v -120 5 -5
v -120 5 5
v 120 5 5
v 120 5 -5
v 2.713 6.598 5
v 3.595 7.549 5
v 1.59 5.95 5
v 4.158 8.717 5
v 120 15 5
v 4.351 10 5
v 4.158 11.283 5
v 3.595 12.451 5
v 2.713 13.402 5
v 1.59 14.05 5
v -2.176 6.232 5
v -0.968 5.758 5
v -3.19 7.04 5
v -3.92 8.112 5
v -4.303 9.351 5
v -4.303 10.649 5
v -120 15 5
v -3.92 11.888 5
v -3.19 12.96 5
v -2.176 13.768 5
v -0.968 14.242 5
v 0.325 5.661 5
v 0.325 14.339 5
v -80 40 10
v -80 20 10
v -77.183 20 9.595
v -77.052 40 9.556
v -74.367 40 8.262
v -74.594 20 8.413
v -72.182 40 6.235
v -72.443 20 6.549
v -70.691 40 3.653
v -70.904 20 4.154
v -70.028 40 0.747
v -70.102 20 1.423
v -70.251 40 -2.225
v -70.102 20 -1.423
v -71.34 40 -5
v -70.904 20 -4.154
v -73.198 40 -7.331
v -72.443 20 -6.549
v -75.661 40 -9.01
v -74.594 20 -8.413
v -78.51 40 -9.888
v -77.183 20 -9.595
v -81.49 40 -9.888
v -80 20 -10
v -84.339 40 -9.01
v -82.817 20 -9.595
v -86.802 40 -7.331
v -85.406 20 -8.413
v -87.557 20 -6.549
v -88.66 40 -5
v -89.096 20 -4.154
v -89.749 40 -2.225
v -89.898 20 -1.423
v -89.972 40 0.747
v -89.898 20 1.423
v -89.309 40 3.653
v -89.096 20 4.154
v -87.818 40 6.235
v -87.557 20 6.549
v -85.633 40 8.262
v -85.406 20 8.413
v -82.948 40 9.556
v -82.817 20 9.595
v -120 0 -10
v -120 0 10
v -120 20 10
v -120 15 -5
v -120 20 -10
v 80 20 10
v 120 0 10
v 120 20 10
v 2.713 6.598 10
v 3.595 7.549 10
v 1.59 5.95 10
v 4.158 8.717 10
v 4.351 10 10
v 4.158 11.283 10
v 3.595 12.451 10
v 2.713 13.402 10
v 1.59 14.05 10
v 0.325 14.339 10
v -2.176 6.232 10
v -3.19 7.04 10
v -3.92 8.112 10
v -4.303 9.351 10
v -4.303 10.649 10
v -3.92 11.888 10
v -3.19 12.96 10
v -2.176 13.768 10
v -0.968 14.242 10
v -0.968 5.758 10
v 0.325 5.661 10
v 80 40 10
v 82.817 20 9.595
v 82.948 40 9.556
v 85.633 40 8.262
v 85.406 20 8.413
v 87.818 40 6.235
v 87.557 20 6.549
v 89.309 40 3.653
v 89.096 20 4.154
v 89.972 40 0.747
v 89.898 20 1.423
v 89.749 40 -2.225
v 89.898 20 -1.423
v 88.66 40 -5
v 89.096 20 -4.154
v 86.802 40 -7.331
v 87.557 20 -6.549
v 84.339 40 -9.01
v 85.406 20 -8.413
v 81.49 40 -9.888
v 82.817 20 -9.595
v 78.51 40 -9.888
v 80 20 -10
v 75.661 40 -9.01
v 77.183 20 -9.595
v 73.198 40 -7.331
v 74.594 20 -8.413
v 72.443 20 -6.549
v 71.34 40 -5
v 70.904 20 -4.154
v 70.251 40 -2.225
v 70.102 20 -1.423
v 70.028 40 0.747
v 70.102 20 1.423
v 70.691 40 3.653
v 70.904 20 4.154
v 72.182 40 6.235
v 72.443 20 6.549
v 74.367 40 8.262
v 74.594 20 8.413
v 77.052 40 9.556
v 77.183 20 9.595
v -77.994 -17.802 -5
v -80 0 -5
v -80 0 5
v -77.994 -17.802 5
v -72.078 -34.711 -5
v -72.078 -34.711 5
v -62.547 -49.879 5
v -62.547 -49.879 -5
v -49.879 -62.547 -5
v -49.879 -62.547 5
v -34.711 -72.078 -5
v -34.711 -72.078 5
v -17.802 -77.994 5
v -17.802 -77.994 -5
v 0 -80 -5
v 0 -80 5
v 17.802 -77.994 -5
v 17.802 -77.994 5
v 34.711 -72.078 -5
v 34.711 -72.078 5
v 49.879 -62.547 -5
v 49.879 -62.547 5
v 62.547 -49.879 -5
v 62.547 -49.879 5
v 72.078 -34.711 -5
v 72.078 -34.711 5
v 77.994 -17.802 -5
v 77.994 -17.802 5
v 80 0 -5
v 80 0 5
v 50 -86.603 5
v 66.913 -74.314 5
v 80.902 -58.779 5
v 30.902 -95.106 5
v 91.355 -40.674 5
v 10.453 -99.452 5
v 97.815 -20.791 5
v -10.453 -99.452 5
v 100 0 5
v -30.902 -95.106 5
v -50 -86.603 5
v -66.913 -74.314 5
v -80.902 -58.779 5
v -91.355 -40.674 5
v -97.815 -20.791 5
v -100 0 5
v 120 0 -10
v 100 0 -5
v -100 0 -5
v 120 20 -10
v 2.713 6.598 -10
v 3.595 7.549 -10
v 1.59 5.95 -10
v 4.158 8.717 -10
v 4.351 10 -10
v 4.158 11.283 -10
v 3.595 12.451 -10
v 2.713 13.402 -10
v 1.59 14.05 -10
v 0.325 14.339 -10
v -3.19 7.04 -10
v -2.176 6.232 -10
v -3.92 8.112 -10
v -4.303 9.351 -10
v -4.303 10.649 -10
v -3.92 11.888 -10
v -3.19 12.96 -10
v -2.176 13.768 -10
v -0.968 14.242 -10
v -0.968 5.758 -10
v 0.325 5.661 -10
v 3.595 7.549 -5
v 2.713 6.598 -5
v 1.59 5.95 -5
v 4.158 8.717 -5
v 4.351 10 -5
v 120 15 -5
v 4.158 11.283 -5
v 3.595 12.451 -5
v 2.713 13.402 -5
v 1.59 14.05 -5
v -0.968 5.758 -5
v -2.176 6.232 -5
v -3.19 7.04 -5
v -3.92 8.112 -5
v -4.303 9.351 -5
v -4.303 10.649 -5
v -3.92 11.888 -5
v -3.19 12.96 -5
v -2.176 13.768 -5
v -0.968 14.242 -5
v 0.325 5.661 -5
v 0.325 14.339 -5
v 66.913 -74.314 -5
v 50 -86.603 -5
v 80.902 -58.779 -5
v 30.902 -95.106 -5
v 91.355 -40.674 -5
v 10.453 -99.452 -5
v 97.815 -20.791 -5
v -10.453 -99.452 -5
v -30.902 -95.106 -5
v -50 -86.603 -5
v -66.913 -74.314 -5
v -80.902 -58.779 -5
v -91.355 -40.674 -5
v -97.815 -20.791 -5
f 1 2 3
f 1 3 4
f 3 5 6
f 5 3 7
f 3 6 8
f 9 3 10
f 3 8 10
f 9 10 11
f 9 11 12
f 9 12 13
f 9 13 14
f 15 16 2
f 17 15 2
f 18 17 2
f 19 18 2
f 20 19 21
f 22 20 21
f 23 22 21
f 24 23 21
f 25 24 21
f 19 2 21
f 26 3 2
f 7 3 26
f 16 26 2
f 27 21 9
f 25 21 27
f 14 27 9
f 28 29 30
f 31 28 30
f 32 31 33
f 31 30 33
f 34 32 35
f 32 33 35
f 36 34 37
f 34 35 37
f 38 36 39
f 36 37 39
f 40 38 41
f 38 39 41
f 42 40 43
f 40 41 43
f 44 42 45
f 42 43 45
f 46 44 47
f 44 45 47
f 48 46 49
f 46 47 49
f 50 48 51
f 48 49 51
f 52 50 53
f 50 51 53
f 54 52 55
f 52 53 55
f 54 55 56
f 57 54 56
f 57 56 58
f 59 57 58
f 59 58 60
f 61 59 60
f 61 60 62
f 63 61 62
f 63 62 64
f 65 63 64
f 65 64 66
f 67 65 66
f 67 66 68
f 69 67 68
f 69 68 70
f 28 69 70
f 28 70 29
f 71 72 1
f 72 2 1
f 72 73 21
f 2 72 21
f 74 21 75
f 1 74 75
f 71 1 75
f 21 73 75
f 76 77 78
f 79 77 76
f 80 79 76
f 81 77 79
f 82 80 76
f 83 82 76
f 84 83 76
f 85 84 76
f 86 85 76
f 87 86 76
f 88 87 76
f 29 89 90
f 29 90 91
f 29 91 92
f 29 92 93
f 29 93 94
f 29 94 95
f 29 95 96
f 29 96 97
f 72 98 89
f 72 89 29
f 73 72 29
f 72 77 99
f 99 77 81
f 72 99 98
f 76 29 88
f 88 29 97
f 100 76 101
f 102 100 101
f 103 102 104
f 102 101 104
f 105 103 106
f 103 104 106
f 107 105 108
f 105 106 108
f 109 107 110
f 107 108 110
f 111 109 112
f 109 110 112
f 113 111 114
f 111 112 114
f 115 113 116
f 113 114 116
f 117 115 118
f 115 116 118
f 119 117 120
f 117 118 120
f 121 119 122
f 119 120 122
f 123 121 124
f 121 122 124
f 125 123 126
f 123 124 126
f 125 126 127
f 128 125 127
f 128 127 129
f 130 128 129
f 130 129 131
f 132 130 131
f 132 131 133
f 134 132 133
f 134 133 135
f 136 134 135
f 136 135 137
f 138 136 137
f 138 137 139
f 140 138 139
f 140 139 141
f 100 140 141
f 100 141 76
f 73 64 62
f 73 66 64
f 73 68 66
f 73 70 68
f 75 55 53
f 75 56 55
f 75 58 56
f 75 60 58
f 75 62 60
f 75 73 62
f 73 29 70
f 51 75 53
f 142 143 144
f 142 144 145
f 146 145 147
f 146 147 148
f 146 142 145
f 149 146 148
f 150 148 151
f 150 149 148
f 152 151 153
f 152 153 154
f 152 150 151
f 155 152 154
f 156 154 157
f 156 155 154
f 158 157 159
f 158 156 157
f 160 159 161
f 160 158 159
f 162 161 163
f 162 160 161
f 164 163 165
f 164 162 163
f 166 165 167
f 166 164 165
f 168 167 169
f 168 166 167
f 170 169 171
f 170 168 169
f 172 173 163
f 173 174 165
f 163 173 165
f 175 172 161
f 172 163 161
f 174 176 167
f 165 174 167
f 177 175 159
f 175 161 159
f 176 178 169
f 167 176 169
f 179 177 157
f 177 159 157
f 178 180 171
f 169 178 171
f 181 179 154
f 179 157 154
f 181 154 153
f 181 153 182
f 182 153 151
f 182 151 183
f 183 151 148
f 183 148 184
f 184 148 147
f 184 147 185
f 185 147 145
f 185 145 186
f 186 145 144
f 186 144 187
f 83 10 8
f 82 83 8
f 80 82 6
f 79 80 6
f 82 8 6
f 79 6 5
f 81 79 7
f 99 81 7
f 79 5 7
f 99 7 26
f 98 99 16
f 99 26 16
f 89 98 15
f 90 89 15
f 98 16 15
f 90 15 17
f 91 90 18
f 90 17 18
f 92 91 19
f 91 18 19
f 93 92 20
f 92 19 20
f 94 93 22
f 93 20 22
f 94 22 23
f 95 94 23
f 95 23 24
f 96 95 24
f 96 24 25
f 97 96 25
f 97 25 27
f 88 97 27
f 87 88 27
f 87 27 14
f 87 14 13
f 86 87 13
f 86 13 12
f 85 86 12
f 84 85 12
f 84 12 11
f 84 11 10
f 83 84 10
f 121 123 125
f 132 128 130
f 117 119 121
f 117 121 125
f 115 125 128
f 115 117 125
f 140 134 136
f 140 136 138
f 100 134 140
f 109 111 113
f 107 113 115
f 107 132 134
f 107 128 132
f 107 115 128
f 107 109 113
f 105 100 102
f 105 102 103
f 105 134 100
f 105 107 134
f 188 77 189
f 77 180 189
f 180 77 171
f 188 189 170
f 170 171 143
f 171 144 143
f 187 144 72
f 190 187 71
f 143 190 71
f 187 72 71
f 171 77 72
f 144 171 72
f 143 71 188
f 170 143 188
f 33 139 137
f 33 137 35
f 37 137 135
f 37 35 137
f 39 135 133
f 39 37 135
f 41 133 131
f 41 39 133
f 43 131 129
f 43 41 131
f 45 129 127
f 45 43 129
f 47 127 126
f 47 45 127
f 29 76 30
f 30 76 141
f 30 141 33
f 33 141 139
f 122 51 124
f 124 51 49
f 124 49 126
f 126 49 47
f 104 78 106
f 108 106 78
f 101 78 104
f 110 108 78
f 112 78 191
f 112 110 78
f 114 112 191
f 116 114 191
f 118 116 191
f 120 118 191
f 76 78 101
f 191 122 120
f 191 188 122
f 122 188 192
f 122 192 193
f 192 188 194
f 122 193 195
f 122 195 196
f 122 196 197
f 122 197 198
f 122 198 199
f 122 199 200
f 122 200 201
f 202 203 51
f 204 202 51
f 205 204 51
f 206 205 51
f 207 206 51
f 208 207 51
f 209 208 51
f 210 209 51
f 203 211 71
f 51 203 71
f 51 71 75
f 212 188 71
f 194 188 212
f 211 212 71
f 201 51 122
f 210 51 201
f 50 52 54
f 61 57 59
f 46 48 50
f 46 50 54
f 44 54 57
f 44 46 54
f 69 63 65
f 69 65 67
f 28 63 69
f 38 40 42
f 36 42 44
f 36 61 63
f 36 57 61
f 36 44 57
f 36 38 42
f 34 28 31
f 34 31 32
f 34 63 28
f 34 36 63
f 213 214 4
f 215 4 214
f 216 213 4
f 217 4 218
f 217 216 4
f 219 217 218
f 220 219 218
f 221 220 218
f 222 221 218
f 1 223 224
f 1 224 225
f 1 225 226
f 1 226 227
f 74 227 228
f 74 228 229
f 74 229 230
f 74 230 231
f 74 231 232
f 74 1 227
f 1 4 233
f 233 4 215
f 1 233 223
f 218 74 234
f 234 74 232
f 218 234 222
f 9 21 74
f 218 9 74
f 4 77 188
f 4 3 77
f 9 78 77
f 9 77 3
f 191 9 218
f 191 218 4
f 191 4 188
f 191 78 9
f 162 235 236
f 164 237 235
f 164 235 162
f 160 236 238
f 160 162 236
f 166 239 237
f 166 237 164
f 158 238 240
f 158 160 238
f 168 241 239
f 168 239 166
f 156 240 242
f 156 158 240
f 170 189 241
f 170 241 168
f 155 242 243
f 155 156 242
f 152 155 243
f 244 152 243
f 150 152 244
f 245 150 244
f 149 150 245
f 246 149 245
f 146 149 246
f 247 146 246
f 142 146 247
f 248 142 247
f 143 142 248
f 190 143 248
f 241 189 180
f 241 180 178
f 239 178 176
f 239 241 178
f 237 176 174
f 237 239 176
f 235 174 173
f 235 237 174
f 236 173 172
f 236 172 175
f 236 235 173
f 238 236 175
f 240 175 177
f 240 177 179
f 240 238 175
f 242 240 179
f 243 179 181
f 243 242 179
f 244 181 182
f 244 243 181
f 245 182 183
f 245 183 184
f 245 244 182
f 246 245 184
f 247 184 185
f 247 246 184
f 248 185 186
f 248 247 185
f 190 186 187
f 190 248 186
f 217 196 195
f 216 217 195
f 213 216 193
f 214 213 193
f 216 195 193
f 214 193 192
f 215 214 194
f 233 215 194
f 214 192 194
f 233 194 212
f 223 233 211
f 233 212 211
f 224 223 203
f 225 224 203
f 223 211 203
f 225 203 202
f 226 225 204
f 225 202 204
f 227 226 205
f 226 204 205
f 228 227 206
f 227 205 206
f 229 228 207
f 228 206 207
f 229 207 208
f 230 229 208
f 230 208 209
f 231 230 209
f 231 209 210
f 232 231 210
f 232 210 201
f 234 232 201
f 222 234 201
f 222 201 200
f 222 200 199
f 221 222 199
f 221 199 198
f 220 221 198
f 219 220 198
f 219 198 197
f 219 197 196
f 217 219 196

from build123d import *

# Parameters (mm, degrees)
BOSS_EXTRU_1_DEPTH      = 5
BOSS_EXTRU_1_DEPTH_BACK = 5
BOSS_EXTRU_2_DEPTH      = 120
BOSS_EXTRU_2_DEPTH_BACK = 120
ESQUISSE2_W             = 20
ESQUISSE2_H             = 20
ESQUISSE2_W_2           = 10
ESQUISSE2_H_2           = 10
ESQUISSE3_R             = 4.351117742
ENL_V_MAT_EXTRU_1_DEPTH = 120
ESQUISSE4_R             = 10
BOSS_EXTRU_3_DEPTH      = 20


with BuildPart() as part:
    # Esquisse1 → Boss.-Extru.1 (new, two sides: drawn at the far end of the back side and taken through both)
    with BuildSketch(Plane.XY.offset(-BOSS_EXTRU_1_DEPTH_BACK)):
        with BuildLine():
            Line((-100, 0), (-80, 0))
            ThreePointArc((-80, 0), (0, -80), (80, 0))
            Line((80, 0), (100, 0))
            ThreePointArc((100, 0), (0, -100), (-100, 0))
        make_face()
    extrude(amount=BOSS_EXTRU_1_DEPTH + BOSS_EXTRU_1_DEPTH_BACK)

    # Esquisse2 → Boss.-Extru.2 (add, two sides: drawn at the far end of the back side and taken through both)
    with BuildSketch(Plane(origin=(0, 0, 0), x_dir=(0, 0, -1), z_dir=(1, 0, 0)).offset(-BOSS_EXTRU_2_DEPTH_BACK)):
        with Locations((0, 10)):
            Rectangle(ESQUISSE2_W, ESQUISSE2_H)
        with Locations((0, 10)):
            Rectangle(ESQUISSE2_W_2, ESQUISSE2_H_2, mode=Mode.SUBTRACT)
    extrude(amount=BOSS_EXTRU_2_DEPTH + BOSS_EXTRU_2_DEPTH_BACK)

    # Esquisse3 → Enlèv. mat.-Extru.1 (cut)
    with BuildSketch(Plane(origin=(0, 0, -10), x_dir=(-1, 0, 0), z_dir=(0, 0, -1))):
        with Locations((0, 10)):
            Circle(ESQUISSE3_R)
    extrude(amount=-ENL_V_MAT_EXTRU_1_DEPTH, mode=Mode.SUBTRACT)

    # Esquisse4 → Boss.-Extru.3 (add)
    with BuildSketch(Plane(origin=(0, 20, 0), x_dir=(1, 0, 0), z_dir=(0, 1, 0))):
        with Locations((-80, 0)):
            Circle(ESQUISSE4_R)
        with Locations((80, 0)):
            Circle(ESQUISSE4_R)
    extrude(amount=BOSS_EXTRU_3_DEPTH)


solid = part.part
